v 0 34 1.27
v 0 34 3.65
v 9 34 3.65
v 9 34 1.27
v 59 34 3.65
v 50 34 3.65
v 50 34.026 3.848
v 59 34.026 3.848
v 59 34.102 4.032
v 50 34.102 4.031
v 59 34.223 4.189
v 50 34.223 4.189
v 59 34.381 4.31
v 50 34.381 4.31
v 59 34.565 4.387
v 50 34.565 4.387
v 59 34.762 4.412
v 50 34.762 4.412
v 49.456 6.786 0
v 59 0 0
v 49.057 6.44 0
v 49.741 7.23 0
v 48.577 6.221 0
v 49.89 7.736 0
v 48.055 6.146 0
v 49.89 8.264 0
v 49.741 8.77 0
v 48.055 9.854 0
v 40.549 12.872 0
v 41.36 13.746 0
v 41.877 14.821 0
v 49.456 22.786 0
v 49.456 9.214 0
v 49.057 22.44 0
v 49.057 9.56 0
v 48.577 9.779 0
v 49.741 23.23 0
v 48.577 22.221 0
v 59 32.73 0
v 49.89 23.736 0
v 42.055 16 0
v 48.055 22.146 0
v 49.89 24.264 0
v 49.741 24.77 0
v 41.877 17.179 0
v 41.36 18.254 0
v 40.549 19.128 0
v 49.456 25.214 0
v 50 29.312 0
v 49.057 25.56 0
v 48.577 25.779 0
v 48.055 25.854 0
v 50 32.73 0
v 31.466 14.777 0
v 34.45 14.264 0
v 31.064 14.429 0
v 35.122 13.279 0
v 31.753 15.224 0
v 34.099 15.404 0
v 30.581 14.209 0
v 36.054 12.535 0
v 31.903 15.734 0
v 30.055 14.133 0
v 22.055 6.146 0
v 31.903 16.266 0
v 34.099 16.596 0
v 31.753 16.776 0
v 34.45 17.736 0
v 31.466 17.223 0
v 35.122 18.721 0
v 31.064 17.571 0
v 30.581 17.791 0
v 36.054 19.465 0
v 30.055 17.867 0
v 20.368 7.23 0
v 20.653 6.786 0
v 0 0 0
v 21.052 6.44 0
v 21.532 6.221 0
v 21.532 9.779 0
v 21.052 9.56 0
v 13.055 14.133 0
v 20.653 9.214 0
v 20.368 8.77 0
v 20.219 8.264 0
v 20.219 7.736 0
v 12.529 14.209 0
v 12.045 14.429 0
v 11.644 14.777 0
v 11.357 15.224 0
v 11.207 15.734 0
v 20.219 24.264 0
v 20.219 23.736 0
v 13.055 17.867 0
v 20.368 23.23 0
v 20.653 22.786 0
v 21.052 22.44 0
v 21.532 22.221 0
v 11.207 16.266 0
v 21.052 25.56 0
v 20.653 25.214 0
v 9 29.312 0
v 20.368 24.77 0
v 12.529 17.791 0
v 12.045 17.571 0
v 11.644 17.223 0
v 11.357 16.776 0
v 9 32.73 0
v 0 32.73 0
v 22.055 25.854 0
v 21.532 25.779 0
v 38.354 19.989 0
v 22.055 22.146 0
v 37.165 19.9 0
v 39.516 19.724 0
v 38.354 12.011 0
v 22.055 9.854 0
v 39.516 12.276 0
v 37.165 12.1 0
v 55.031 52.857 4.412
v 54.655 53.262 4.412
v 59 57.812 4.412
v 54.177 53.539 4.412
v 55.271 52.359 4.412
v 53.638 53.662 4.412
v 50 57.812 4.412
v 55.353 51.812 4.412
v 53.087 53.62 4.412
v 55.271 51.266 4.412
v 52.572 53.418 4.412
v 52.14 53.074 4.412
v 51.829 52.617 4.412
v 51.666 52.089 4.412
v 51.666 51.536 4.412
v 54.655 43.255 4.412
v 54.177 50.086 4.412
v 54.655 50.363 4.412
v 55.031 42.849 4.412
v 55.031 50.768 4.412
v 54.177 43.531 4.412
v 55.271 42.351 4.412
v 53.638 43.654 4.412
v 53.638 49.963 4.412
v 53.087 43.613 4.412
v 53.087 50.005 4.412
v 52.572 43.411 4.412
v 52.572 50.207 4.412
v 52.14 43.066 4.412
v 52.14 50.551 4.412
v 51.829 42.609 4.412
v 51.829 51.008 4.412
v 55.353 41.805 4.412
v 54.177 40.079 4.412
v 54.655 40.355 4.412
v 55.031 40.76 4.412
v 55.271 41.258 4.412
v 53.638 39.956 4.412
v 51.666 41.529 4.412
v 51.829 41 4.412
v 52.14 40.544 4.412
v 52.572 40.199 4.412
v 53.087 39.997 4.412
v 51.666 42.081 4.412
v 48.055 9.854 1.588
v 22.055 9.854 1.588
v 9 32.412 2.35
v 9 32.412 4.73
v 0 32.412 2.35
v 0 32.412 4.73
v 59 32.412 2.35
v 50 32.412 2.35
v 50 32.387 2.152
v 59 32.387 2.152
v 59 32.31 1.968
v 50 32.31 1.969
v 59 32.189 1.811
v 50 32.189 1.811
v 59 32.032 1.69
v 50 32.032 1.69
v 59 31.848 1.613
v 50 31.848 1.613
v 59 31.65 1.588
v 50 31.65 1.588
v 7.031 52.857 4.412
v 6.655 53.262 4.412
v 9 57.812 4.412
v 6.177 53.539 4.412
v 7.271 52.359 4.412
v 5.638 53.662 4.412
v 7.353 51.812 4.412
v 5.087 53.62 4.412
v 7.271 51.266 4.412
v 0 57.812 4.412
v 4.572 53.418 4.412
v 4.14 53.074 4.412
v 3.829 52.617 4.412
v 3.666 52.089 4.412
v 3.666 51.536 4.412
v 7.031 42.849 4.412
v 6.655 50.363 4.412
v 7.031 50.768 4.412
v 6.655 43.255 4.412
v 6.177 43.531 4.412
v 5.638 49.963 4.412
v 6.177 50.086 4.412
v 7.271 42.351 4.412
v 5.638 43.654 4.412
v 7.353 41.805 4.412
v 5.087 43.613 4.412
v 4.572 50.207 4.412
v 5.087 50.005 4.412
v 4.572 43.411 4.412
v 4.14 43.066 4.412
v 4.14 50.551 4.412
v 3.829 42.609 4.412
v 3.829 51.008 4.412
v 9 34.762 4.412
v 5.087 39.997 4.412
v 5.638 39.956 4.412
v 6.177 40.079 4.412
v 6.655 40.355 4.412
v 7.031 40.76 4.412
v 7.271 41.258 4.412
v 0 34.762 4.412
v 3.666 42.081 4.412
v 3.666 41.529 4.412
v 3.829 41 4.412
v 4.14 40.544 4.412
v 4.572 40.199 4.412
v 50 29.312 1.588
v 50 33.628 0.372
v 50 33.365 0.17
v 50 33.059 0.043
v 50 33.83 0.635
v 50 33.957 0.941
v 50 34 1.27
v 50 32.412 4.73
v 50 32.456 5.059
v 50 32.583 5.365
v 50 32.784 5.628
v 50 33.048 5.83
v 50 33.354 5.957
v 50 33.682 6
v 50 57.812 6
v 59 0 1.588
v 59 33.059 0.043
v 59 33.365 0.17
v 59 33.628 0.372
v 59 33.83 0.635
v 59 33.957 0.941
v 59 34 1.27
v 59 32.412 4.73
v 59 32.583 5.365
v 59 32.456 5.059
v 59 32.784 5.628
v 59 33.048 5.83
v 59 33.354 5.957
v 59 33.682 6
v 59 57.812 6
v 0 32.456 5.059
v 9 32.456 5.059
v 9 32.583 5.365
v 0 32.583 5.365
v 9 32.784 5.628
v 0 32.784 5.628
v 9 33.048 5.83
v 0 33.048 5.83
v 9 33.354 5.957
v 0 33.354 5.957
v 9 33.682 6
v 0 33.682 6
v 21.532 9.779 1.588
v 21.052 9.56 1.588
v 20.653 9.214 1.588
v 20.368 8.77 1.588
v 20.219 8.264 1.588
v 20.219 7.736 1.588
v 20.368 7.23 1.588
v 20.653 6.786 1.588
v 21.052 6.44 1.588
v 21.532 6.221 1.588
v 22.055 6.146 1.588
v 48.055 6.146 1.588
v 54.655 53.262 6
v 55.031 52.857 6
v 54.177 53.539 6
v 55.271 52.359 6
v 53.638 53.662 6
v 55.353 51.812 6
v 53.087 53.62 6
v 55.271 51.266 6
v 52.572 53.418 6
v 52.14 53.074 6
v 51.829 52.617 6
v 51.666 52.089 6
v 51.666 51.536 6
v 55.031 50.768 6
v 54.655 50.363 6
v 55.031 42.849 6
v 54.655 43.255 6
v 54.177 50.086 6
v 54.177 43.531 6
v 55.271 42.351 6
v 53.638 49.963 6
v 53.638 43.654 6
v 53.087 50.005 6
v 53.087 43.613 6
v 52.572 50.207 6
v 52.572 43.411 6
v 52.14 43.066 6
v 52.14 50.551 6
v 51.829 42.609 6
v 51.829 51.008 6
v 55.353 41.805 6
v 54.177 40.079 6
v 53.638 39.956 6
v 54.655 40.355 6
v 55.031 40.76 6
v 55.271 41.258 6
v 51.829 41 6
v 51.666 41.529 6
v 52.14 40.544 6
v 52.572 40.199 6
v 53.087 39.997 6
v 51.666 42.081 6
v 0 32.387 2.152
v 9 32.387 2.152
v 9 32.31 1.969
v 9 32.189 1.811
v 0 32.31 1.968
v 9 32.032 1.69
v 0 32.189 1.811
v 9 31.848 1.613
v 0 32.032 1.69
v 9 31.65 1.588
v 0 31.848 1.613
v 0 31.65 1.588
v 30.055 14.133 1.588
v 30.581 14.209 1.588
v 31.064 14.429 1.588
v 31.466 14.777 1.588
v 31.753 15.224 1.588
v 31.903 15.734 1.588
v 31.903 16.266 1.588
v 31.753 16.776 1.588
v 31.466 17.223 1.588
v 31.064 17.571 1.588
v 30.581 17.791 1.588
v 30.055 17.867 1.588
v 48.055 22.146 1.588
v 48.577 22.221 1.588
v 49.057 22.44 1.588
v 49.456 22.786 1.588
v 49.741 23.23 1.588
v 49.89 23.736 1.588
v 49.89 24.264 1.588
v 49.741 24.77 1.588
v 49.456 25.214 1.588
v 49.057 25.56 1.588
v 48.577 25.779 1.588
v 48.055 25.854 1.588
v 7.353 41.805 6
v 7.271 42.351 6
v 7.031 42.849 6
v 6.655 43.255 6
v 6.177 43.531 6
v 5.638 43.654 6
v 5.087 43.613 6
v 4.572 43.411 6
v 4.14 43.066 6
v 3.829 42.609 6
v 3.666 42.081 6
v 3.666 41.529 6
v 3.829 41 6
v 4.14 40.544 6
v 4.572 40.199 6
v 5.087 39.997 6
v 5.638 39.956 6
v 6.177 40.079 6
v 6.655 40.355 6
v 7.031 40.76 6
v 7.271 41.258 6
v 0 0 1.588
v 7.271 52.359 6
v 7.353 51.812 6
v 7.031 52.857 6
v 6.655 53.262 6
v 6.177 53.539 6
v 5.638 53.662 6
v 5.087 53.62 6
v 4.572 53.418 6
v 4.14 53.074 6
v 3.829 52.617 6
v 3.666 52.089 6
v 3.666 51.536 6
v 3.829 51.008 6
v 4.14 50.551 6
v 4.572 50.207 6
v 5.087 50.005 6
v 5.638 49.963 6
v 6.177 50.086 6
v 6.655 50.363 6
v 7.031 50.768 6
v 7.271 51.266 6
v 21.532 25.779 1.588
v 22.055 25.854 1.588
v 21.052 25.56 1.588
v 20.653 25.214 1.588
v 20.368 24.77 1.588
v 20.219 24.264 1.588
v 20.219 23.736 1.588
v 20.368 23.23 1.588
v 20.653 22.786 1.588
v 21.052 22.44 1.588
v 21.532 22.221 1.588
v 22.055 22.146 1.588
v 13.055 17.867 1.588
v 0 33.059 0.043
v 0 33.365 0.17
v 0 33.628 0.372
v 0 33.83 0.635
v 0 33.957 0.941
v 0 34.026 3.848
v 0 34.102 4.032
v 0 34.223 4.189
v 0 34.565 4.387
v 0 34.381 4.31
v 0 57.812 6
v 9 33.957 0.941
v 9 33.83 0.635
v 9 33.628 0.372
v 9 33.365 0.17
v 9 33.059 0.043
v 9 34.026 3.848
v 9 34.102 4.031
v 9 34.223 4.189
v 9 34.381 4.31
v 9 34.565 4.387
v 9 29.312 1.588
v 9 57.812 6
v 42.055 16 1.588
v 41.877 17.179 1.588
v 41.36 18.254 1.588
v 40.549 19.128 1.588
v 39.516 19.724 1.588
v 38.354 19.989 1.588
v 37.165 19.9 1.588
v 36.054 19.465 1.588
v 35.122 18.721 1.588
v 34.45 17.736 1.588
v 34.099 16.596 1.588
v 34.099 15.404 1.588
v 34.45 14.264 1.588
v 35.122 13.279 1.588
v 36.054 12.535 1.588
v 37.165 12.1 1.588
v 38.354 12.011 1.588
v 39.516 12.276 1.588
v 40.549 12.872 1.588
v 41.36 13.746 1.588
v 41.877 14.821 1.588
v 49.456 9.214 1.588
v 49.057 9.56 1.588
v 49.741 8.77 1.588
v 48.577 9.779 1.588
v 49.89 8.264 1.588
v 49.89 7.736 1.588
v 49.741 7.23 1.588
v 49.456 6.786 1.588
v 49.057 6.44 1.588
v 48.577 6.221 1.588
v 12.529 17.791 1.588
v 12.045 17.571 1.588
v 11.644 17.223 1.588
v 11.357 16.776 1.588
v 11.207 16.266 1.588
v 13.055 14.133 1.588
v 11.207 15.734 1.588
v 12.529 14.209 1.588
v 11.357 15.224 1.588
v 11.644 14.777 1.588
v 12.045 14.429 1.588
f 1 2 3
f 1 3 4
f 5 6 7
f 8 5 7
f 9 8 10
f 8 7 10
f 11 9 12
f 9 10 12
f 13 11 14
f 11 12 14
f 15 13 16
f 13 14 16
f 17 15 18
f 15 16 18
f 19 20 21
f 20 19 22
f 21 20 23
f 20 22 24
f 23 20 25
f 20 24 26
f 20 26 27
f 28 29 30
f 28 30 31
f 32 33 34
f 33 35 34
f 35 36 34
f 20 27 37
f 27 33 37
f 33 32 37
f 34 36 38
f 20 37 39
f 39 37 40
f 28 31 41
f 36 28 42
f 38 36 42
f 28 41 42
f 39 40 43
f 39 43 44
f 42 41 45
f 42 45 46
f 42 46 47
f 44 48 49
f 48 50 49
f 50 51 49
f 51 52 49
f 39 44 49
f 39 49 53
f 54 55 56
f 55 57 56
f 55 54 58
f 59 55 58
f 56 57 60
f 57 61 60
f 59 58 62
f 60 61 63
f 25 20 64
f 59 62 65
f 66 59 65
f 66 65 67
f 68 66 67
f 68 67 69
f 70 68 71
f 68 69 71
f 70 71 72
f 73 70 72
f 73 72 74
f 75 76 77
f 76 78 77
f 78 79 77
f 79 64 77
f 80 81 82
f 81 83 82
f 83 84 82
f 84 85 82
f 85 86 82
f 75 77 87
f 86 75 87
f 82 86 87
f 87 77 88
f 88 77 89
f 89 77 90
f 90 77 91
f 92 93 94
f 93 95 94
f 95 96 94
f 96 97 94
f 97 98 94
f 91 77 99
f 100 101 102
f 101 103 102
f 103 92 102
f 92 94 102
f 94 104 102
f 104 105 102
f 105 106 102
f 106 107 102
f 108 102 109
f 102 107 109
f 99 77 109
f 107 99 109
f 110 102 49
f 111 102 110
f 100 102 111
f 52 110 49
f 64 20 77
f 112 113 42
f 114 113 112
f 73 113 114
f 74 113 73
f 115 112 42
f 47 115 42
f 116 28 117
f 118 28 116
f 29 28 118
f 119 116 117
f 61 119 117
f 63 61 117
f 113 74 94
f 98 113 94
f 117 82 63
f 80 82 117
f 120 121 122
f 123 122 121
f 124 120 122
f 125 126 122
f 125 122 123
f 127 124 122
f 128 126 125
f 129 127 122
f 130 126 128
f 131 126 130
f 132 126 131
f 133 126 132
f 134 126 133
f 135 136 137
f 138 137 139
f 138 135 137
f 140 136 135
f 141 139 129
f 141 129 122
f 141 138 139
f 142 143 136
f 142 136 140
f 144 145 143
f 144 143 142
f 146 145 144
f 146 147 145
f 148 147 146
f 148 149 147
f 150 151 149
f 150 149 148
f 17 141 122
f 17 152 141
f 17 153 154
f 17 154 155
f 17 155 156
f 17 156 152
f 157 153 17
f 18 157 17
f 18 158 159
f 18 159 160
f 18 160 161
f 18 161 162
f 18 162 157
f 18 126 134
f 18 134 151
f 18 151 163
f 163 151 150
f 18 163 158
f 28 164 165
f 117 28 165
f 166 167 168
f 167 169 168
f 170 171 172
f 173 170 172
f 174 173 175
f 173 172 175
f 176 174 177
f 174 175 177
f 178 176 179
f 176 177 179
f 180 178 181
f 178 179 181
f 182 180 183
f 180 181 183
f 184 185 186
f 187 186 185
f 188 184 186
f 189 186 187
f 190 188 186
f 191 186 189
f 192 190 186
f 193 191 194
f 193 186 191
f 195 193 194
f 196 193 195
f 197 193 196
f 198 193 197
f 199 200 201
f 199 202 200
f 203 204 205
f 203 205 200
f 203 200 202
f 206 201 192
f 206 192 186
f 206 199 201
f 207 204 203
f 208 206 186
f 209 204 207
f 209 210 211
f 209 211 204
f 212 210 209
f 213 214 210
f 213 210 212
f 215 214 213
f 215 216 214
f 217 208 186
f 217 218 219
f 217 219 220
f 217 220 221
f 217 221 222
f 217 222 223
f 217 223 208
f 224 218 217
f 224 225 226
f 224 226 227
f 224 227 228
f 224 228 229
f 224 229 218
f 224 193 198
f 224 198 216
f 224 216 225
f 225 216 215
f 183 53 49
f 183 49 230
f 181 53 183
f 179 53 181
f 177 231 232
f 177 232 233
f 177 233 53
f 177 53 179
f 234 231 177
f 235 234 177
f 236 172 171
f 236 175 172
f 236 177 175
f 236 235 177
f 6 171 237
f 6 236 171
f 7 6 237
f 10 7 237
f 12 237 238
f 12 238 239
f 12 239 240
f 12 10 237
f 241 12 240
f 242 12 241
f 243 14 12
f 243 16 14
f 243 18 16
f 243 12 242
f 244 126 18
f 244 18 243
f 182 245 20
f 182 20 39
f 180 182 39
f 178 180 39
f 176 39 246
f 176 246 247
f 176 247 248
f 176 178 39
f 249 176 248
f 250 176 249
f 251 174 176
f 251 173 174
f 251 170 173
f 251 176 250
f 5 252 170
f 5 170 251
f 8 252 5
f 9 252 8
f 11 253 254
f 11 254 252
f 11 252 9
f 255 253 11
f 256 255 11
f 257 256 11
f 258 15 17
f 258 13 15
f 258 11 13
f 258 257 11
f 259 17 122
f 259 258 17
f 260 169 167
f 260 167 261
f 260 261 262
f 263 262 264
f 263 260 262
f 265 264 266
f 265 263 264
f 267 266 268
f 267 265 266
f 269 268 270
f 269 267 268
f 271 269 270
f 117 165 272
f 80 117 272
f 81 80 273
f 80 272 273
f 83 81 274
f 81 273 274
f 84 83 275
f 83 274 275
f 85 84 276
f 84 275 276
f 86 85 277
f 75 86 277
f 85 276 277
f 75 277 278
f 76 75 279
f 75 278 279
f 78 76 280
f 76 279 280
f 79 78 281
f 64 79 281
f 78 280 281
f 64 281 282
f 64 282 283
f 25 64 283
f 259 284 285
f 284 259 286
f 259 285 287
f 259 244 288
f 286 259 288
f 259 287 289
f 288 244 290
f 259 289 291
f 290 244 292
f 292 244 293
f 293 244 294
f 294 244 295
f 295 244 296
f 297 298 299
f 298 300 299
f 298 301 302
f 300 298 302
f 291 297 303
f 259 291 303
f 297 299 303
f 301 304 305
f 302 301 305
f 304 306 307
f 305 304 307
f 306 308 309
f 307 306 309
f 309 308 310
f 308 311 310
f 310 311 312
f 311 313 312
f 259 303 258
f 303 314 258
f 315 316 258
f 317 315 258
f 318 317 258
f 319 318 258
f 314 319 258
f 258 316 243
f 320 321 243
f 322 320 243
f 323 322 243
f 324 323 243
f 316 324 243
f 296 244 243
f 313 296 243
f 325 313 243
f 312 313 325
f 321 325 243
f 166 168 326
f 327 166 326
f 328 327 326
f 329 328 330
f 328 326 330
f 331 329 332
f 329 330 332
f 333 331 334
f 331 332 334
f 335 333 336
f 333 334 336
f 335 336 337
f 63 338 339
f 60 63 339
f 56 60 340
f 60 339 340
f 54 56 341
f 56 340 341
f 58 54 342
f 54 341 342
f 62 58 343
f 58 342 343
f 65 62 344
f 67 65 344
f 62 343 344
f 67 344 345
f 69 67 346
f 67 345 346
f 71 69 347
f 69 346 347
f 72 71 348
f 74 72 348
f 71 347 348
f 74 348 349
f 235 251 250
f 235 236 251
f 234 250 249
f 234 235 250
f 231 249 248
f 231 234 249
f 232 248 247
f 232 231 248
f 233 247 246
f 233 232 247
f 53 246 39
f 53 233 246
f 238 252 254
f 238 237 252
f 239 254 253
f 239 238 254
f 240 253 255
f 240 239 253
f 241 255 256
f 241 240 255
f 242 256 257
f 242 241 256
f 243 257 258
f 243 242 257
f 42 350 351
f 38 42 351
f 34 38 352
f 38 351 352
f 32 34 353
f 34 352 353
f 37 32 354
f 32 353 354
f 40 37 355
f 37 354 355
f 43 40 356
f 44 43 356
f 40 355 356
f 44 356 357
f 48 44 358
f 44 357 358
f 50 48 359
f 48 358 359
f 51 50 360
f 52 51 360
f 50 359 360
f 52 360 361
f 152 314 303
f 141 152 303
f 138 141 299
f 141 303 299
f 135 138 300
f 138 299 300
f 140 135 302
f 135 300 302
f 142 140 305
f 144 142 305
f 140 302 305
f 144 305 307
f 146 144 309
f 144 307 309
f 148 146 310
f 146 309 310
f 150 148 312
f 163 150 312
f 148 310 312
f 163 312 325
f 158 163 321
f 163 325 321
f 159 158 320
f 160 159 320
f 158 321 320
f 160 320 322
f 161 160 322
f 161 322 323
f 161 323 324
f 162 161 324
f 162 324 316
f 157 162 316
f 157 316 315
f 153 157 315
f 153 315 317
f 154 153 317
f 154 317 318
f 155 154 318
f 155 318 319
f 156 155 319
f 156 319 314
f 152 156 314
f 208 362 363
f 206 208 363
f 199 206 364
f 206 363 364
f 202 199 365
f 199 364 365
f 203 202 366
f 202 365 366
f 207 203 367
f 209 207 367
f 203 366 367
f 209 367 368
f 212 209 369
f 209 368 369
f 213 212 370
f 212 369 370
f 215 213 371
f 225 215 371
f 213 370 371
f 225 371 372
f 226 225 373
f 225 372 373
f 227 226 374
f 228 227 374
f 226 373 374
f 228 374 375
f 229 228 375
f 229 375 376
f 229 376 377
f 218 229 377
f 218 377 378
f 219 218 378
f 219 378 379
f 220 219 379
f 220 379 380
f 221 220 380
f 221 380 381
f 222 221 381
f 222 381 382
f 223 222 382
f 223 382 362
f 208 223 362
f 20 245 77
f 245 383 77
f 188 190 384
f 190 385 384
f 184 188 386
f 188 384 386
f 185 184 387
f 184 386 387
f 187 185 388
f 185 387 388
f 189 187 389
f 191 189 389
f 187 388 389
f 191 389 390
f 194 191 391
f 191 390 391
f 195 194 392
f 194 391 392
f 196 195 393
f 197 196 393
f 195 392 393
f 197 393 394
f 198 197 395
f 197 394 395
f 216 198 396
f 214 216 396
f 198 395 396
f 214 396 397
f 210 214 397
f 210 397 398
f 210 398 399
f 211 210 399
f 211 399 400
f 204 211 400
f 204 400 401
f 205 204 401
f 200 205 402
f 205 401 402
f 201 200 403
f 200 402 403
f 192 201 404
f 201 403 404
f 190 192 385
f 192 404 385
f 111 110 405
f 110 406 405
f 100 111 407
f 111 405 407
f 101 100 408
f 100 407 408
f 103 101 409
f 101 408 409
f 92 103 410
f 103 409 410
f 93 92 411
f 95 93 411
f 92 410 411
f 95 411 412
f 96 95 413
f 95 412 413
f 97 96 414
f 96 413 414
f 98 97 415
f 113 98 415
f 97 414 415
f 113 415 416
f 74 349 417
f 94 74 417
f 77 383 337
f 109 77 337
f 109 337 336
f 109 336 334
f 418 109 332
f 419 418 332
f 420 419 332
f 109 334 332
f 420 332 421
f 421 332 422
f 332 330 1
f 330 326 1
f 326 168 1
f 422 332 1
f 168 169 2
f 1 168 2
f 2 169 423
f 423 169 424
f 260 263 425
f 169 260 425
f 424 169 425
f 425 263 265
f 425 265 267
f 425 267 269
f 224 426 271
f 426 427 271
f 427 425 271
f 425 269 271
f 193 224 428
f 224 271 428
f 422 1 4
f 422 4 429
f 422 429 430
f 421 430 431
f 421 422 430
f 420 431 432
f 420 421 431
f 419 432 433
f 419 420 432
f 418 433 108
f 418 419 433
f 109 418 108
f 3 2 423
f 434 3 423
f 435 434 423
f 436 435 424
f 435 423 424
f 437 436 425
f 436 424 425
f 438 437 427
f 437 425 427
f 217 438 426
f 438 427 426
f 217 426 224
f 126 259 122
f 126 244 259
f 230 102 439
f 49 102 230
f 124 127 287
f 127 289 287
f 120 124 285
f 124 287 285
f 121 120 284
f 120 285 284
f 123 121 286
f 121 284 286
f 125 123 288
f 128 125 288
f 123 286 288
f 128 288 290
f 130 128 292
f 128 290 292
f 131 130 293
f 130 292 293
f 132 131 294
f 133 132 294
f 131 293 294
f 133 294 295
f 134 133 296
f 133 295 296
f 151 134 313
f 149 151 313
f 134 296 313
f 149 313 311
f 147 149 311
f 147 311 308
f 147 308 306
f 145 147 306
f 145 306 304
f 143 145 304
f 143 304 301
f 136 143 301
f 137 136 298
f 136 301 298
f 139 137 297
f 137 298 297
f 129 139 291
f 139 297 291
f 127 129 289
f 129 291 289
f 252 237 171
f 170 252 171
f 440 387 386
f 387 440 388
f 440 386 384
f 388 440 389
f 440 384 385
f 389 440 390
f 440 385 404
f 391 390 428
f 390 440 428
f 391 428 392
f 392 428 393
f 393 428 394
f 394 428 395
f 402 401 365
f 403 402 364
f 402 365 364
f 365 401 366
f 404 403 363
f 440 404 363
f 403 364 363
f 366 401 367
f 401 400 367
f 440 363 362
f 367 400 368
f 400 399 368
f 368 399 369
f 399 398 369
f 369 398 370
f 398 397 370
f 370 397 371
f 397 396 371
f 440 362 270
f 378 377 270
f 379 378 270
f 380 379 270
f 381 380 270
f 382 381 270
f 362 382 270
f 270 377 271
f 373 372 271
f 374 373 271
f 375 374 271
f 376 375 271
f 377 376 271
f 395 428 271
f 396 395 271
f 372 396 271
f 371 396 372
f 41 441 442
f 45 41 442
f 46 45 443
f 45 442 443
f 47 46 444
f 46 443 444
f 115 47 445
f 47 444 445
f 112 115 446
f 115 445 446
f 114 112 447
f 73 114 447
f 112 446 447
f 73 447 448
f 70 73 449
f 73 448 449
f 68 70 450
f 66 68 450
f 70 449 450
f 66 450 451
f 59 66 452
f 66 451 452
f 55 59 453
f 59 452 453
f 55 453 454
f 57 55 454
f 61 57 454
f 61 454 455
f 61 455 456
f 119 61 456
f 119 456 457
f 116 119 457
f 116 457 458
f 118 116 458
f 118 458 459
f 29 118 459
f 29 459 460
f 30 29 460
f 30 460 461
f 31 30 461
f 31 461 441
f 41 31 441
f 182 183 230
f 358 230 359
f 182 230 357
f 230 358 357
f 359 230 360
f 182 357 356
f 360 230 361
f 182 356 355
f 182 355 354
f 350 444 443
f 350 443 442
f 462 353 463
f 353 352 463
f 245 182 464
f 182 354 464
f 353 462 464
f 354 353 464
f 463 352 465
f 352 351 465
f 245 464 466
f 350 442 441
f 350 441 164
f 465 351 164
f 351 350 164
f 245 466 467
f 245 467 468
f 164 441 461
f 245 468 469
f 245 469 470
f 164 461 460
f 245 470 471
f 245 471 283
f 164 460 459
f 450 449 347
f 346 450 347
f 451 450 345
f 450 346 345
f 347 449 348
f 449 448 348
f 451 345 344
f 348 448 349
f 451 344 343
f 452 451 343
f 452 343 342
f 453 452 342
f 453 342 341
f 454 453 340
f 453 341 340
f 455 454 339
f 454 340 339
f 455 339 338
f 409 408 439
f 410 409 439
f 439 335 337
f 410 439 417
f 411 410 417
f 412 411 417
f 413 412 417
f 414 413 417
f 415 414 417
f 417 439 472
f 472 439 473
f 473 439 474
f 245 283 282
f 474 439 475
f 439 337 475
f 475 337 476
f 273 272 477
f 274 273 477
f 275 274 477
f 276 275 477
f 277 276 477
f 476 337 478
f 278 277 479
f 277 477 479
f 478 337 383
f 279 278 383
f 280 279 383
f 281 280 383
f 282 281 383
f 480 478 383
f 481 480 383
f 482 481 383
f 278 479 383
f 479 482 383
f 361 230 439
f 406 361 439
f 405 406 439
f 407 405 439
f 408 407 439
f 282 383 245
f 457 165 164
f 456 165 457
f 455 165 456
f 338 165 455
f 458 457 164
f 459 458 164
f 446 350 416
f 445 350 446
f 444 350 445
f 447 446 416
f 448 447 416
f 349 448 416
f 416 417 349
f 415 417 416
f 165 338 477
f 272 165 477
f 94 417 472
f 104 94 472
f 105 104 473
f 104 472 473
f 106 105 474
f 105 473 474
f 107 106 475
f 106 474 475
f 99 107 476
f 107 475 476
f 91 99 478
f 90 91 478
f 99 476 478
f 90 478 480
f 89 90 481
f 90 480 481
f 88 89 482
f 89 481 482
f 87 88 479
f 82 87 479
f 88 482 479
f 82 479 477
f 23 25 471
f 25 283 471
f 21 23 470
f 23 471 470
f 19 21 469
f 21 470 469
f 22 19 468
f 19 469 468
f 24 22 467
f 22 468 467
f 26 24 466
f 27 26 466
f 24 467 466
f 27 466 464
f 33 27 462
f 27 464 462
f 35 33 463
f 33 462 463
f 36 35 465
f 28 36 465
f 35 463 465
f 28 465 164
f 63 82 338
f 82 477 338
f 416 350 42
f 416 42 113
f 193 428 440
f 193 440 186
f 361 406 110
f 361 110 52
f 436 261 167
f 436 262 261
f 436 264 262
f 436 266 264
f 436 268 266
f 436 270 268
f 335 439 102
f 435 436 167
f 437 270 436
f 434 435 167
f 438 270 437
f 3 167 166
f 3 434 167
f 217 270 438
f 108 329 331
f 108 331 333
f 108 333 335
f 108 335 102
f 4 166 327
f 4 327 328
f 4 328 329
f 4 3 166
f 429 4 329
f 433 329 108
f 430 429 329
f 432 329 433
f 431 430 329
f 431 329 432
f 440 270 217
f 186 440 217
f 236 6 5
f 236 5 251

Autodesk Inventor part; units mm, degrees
ref_plane "YZ Plane" through (0, 0, 0) normal (1, 0, 0) x (0, 1, 0)
ref_plane "XZ Plane" through (0, 0, 0) normal (0, 1, 0) x (-1, 0, 0)
ref_plane "XY Plane" through (0, 0, 0) normal (0, 0, 1) x (1, 0, 0)
sketch "Sketch1" plane through (0, 0, 0) normal (1, 0, 0) x (0, 1, 0)
  line L0 (0, 0) -> (32.73, 0)
  line L1 (34, 1.27) -> (34, 1.5875)
  line L2 (31.6505, 1.5875) -> (0, 1.5875)
  line L3 (0, 1.5875) -> (0, 0)
  line L4 (34, 6) -> (32.4125, 6)
  line L5 (32.4125, 4.73) -> (32.4125, 2.3495)
  line L6 (33.6825, 6) -> (57.8125, 6)
  line L7 (57.8125, 6) -> (57.8125, 4.4125)
  line L8 (57.8125, 4.4125) -> (34.762, 4.4125)
  arc A0 (34.762, 4.4125) -> (34, 3.6505) centre (34.762, 3.6505) ccw
  arc A1 (31.6505, 1.5875) -> (32.4125, 2.3495) centre (31.6505, 2.3495) ccw
  arc A2 (32.73, 0) -> (34, 1.27) centre (32.73, 1.27) ccw
  arc A3 (33.6825, 6) -> (32.4125, 4.73) centre (33.6825, 4.73) ccw
  line L9 (34, 3.6505) -> (34, 1.5875)
  point P0 (32.4125, 0)
  dimension "d0" = 34
  dimension "d1" = 1.5875
  dimension "d3" = 1.5875
  dimension "d4" = 25.4
  dimension "d5" = 1.5875
  dimension "d7" = 1.27
extrude "Extrusion1" add sketch "Sketch1" along normal blind 59
sketch "Sketch2" plane through (0, 57.8125, 6) normal (0, 1, 0) x (1, 0, 0)
  line L0 (0, 0) -> (59, 0) projected
  line L1 (0, 1.5875) -> (59, 1.5875) projected
  line L2 (0, 0) -> (9, 0)
  line L3 (59, 0) -> (50, 0)
  line L4 (50, 0) -> (9, 0)
  line L5 (9, 0) -> (9, 6.35)
  line L6 (9, 6.35) -> (50, 6.35)
  line L7 (50, 6.35) -> (50, 0)
  point P0 (0, 6)
  dimension "d10" = 9
  dimension "d11" = 9
extrude "Extrusion2" cut sketch "Sketch2" against normal blind 28.5
sketch "Sketch3" plane through (0, 0, 1.5875) normal (0, 0, 1) x (1, 0, 0)
  line L0 (50, 29.3125) -> (9, 29.3125) projected
  circle A0 centre (38.0547, 16) radius 4.0005
  line L1 (48.0547, 8) -> (22.0547, 8)
  line L2 (48.0547, 8) -> (22.0547, 8) construction
  line L3 (48.0547, 9.8542) -> (22.0547, 9.8542)
  line L4 (22.0547, 6.1458) -> (48.0547, 6.1458)
  arc A1 (48.0547, 6.1458) -> (48.0547, 9.8542) centre (48.0547, 8) ccw
  arc A2 (22.0547, 9.8542) -> (22.0547, 6.1458) centre (22.0547, 8) ccw
  line L5 (48.0547, 24) -> (22.0547, 24) construction
  line L6 (48.0547, 22.1458) -> (22.0547, 22.1458)
  line L7 (22.0547, 25.8542) -> (48.0547, 25.8542)
  arc A3 (48.0547, 22.1458) -> (48.0547, 25.8542) centre (48.0547, 24) ccw
  arc A4 (22.0547, 25.8542) -> (22.0547, 22.1458) centre (22.0547, 24) ccw
  line L8 (30.0547, 16) -> (13.0547, 16)
  line L9 (30.0547, 16) -> (13.0547, 16) construction
  line L10 (30.0547, 17.8669) -> (13.0547, 17.8669)
  line L11 (13.0547, 14.1331) -> (30.0547, 14.1331)
  arc A5 (30.0547, 14.1331) -> (30.0547, 17.8669) centre (30.0547, 16) ccw
  arc A6 (13.0547, 17.8669) -> (13.0547, 14.1331) centre (13.0547, 16) ccw
  point P0 (35.0547, 8)
  point P1 (21.5547, 16)
  dimension "d21" = 17
  dimension "d22" = 3.7338
extrude "Extrusion3" cut sketch "Sketch3" against normal blind 28.5
sketch "Sketch4" plane through (0, 33.6825, 6) normal (0, 0, 1) x (1, 0, 0)
  line L0 (50, 24.13) -> (50, 0) projected
  line L1 (50, 0) -> (59, 0) projected
  line L2 (59, 24.13) -> (59, 0) projected
  line L3 (50, 24.13) -> (59, 24.13) projected
  circle A0 centre (5.4991, 18.13) radius 1.8542
  circle A1 centre (5.4991, 8.1224) radius 1.8542
  circle A2 centre (53.4991, 18.13) radius 1.8542
  circle A3 centre (53.4991, 8.1224) radius 1.8542
  point P0 (0, -33.6825)
extrude "Extrusion4" cut sketch "Sketch4" against normal blind 28.5 contours A0 | A1 | A2 | A3
properties part number "Side Servo Mount"
